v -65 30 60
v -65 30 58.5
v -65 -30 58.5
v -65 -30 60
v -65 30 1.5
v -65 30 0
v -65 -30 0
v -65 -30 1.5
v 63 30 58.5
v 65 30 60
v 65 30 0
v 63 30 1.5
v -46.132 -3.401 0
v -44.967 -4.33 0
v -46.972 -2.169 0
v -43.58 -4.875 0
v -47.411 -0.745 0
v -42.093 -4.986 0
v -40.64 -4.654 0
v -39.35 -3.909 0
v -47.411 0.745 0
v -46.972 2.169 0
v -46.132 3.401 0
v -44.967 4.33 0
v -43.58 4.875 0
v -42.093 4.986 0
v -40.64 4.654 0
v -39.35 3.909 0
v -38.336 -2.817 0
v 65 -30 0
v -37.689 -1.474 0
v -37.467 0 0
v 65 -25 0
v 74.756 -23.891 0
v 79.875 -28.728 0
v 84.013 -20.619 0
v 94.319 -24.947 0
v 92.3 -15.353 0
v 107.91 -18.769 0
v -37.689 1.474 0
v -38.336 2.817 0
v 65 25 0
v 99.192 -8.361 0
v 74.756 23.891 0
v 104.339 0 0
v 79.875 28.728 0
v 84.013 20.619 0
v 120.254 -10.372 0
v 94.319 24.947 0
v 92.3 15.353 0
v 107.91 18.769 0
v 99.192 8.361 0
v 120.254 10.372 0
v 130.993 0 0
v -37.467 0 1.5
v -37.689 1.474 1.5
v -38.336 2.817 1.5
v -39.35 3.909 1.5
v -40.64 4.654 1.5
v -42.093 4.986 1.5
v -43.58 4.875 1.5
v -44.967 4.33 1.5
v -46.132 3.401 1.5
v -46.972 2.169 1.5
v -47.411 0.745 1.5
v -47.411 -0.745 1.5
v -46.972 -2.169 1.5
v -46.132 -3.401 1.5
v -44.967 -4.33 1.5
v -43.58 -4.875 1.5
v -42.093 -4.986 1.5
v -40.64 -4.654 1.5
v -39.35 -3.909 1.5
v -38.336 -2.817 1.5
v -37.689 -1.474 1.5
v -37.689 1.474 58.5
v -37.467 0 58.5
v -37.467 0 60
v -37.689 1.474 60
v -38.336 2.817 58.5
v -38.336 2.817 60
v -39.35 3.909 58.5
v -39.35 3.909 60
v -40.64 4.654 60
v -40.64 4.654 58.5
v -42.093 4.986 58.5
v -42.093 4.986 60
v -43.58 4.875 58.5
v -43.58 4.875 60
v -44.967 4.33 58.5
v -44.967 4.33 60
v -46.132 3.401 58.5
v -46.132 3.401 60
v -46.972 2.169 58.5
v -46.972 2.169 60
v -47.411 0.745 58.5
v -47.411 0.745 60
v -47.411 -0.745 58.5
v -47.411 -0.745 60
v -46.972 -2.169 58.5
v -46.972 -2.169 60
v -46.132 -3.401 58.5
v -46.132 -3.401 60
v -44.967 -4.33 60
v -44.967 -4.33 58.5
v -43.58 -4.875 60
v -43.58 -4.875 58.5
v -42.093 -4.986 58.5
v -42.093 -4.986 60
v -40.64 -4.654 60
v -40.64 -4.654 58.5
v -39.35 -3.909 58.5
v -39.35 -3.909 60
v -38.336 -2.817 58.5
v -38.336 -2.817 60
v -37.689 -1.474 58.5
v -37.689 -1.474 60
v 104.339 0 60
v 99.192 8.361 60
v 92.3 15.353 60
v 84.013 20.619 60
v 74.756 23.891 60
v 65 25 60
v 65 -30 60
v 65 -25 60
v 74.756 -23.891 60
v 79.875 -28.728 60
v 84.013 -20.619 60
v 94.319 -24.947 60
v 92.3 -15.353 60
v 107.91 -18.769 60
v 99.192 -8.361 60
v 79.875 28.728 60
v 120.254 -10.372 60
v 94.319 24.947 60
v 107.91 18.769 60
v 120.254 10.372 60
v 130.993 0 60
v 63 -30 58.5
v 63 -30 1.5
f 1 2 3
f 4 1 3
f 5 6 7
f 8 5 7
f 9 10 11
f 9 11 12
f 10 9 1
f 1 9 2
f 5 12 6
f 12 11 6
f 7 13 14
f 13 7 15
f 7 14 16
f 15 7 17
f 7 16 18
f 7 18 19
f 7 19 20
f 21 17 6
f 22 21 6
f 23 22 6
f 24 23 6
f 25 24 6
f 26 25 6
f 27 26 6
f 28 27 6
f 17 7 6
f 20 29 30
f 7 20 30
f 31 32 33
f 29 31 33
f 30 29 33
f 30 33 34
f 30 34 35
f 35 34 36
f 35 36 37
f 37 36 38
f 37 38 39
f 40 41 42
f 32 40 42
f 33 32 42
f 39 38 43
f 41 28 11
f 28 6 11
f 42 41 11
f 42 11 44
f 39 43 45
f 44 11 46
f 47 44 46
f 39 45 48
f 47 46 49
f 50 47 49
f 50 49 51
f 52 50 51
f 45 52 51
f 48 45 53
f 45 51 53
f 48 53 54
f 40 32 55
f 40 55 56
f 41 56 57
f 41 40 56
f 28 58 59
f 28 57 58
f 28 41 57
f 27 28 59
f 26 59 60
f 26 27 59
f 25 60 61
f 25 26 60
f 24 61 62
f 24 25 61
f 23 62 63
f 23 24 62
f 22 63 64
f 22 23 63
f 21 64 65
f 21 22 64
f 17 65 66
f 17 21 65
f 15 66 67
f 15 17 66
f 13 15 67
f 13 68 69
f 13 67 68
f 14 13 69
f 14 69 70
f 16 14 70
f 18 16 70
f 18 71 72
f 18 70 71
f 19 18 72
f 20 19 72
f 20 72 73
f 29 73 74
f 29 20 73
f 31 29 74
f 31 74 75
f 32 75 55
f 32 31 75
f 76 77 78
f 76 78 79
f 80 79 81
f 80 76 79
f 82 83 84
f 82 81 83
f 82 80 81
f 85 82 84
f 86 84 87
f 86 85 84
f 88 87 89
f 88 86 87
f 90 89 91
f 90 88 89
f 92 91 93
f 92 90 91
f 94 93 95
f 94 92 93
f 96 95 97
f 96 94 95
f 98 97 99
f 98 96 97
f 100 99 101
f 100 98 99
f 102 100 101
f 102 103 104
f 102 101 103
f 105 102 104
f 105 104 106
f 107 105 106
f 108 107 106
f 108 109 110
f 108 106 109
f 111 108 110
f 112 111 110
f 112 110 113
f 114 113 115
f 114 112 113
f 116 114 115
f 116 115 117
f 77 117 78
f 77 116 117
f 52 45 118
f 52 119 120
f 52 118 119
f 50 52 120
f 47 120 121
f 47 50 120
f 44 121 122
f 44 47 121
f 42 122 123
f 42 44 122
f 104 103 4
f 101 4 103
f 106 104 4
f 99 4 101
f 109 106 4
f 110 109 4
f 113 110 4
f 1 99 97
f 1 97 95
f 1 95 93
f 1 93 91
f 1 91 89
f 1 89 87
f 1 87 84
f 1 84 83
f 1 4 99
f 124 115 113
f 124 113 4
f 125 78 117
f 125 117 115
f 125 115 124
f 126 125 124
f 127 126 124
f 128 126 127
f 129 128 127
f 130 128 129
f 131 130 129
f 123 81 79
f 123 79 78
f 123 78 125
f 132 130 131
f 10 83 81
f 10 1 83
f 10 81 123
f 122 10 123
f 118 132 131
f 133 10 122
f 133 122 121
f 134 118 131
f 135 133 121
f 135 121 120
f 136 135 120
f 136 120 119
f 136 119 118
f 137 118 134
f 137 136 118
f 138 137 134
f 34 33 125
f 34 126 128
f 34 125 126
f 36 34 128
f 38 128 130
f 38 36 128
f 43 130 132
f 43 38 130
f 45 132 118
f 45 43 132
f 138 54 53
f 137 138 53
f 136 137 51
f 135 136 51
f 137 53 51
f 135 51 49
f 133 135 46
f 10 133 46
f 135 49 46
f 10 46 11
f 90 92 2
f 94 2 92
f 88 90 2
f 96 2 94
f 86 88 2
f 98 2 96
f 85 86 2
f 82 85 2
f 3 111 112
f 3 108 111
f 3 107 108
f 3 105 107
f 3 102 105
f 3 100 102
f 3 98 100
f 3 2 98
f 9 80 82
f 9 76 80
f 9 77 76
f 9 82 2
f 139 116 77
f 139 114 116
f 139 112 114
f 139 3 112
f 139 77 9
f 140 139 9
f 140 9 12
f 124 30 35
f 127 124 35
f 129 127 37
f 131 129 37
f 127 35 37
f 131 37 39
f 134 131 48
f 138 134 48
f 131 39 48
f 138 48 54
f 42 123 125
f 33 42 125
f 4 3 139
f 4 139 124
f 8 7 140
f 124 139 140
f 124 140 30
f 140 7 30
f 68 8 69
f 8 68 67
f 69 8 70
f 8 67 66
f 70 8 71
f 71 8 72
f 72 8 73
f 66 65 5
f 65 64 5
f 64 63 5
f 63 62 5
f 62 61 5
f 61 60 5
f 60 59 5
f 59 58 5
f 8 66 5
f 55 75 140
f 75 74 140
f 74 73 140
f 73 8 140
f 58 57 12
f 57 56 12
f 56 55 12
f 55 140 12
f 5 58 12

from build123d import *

# Parameters (mm, degrees)
RESSALTO_EXTRUS_O1_DEPTH   = 60
CORTE_EXTRUS_O1_DEPTH      = 148.170653102
CORTE_EXTRUS_O1_DEPTH_BACK = 148.170653102
CORTE_EXTRUS_O2_DEPTH      = 148.170653102
CORTE_EXTRUS_O2_DEPTH_BACK = 148.170653102
ESBO_O5_W                  = 126
ESBO_O5_H                  = 57
ESBO_O6_W                  = 57
ESBO_O6_H                  = 60
CORTE_EXTRUS_O3_DEPTH      = 57
CORTE_EXTRUS_O4_DEPTH      = 148.170653102
CORTE_EXTRUS_O4_DEPTH_BACK = 57
ESBO_O7_R                  = 5


with BuildPart() as part:
    # Esboço1 → Ressalto-extrusão1 (new body)
    with BuildSketch(Plane.XY):
        with BuildLine():
            Line((65, 30), (-65, 30))
            Line((-65, 30), (-65, -30))
            Line((-65, -30), (65, -30))
            ThreePointArc((65, -30), (101.246012625, -22.148036763), (130.993133921, 0))
            ThreePointArc((130.993133921, 0), (101.246012625, 22.148036763), (65, 30))
        make_face()
    extrude(amount=RESSALTO_EXTRUS_O1_DEPTH)

    # Esboço3 → Corte-extrusão1 (cut, two sides: drawn at the far end of the back side and taken through both)
    with BuildSketch(Plane.XY.offset(-CORTE_EXTRUS_O1_DEPTH_BACK)):
        with BuildLine():
            Line((65, 25), (65, -25))
            ThreePointArc((65, -25), (88.305470739, -18.221231084), (104.339291624, 0))
            ThreePointArc((104.339291624, 0), (88.305470739, 18.221231084), (65, 25))
        make_face()
    extrude(amount=CORTE_EXTRUS_O1_DEPTH + CORTE_EXTRUS_O1_DEPTH_BACK, mode=Mode.SUBTRACT)

    # Esboço5 → Corte-extrusão2 (cut, two sides: drawn at the far end of the back side and taken through both)
    with BuildSketch(Plane(origin=(0, 0, 0), x_dir=(1, 0, 0), z_dir=(0, 1, 0)).offset(-CORTE_EXTRUS_O2_DEPTH_BACK)):
        with Locations((0, -30)):
            Rectangle(ESBO_O5_W, ESBO_O5_H)
    extrude(amount=CORTE_EXTRUS_O2_DEPTH + CORTE_EXTRUS_O2_DEPTH_BACK, mode=Mode.SUBTRACT)

    # Esboço6 → Corte-extrusão3 (cut)
    with BuildSketch(Plane(origin=(-63, 0, 0), x_dir=(0, 0, -1), z_dir=(1, 0, 0))):
        with Locations((-30, 0)):
            Rectangle(ESBO_O6_W, ESBO_O6_H)
    extrude(amount=-CORTE_EXTRUS_O3_DEPTH, mode=Mode.SUBTRACT)

    # Esboço7 → Corte-extrusão4 (cut, two sides: drawn at the far end of the back side and taken through both)
    with BuildSketch(Plane.XY.offset(-CORTE_EXTRUS_O4_DEPTH_BACK)):
        with Locations((-42.467037106, 0)):
            Circle(ESBO_O7_R)
    extrude(amount=CORTE_EXTRUS_O4_DEPTH + CORTE_EXTRUS_O4_DEPTH_BACK, mode=Mode.SUBTRACT)


solid = part.part
